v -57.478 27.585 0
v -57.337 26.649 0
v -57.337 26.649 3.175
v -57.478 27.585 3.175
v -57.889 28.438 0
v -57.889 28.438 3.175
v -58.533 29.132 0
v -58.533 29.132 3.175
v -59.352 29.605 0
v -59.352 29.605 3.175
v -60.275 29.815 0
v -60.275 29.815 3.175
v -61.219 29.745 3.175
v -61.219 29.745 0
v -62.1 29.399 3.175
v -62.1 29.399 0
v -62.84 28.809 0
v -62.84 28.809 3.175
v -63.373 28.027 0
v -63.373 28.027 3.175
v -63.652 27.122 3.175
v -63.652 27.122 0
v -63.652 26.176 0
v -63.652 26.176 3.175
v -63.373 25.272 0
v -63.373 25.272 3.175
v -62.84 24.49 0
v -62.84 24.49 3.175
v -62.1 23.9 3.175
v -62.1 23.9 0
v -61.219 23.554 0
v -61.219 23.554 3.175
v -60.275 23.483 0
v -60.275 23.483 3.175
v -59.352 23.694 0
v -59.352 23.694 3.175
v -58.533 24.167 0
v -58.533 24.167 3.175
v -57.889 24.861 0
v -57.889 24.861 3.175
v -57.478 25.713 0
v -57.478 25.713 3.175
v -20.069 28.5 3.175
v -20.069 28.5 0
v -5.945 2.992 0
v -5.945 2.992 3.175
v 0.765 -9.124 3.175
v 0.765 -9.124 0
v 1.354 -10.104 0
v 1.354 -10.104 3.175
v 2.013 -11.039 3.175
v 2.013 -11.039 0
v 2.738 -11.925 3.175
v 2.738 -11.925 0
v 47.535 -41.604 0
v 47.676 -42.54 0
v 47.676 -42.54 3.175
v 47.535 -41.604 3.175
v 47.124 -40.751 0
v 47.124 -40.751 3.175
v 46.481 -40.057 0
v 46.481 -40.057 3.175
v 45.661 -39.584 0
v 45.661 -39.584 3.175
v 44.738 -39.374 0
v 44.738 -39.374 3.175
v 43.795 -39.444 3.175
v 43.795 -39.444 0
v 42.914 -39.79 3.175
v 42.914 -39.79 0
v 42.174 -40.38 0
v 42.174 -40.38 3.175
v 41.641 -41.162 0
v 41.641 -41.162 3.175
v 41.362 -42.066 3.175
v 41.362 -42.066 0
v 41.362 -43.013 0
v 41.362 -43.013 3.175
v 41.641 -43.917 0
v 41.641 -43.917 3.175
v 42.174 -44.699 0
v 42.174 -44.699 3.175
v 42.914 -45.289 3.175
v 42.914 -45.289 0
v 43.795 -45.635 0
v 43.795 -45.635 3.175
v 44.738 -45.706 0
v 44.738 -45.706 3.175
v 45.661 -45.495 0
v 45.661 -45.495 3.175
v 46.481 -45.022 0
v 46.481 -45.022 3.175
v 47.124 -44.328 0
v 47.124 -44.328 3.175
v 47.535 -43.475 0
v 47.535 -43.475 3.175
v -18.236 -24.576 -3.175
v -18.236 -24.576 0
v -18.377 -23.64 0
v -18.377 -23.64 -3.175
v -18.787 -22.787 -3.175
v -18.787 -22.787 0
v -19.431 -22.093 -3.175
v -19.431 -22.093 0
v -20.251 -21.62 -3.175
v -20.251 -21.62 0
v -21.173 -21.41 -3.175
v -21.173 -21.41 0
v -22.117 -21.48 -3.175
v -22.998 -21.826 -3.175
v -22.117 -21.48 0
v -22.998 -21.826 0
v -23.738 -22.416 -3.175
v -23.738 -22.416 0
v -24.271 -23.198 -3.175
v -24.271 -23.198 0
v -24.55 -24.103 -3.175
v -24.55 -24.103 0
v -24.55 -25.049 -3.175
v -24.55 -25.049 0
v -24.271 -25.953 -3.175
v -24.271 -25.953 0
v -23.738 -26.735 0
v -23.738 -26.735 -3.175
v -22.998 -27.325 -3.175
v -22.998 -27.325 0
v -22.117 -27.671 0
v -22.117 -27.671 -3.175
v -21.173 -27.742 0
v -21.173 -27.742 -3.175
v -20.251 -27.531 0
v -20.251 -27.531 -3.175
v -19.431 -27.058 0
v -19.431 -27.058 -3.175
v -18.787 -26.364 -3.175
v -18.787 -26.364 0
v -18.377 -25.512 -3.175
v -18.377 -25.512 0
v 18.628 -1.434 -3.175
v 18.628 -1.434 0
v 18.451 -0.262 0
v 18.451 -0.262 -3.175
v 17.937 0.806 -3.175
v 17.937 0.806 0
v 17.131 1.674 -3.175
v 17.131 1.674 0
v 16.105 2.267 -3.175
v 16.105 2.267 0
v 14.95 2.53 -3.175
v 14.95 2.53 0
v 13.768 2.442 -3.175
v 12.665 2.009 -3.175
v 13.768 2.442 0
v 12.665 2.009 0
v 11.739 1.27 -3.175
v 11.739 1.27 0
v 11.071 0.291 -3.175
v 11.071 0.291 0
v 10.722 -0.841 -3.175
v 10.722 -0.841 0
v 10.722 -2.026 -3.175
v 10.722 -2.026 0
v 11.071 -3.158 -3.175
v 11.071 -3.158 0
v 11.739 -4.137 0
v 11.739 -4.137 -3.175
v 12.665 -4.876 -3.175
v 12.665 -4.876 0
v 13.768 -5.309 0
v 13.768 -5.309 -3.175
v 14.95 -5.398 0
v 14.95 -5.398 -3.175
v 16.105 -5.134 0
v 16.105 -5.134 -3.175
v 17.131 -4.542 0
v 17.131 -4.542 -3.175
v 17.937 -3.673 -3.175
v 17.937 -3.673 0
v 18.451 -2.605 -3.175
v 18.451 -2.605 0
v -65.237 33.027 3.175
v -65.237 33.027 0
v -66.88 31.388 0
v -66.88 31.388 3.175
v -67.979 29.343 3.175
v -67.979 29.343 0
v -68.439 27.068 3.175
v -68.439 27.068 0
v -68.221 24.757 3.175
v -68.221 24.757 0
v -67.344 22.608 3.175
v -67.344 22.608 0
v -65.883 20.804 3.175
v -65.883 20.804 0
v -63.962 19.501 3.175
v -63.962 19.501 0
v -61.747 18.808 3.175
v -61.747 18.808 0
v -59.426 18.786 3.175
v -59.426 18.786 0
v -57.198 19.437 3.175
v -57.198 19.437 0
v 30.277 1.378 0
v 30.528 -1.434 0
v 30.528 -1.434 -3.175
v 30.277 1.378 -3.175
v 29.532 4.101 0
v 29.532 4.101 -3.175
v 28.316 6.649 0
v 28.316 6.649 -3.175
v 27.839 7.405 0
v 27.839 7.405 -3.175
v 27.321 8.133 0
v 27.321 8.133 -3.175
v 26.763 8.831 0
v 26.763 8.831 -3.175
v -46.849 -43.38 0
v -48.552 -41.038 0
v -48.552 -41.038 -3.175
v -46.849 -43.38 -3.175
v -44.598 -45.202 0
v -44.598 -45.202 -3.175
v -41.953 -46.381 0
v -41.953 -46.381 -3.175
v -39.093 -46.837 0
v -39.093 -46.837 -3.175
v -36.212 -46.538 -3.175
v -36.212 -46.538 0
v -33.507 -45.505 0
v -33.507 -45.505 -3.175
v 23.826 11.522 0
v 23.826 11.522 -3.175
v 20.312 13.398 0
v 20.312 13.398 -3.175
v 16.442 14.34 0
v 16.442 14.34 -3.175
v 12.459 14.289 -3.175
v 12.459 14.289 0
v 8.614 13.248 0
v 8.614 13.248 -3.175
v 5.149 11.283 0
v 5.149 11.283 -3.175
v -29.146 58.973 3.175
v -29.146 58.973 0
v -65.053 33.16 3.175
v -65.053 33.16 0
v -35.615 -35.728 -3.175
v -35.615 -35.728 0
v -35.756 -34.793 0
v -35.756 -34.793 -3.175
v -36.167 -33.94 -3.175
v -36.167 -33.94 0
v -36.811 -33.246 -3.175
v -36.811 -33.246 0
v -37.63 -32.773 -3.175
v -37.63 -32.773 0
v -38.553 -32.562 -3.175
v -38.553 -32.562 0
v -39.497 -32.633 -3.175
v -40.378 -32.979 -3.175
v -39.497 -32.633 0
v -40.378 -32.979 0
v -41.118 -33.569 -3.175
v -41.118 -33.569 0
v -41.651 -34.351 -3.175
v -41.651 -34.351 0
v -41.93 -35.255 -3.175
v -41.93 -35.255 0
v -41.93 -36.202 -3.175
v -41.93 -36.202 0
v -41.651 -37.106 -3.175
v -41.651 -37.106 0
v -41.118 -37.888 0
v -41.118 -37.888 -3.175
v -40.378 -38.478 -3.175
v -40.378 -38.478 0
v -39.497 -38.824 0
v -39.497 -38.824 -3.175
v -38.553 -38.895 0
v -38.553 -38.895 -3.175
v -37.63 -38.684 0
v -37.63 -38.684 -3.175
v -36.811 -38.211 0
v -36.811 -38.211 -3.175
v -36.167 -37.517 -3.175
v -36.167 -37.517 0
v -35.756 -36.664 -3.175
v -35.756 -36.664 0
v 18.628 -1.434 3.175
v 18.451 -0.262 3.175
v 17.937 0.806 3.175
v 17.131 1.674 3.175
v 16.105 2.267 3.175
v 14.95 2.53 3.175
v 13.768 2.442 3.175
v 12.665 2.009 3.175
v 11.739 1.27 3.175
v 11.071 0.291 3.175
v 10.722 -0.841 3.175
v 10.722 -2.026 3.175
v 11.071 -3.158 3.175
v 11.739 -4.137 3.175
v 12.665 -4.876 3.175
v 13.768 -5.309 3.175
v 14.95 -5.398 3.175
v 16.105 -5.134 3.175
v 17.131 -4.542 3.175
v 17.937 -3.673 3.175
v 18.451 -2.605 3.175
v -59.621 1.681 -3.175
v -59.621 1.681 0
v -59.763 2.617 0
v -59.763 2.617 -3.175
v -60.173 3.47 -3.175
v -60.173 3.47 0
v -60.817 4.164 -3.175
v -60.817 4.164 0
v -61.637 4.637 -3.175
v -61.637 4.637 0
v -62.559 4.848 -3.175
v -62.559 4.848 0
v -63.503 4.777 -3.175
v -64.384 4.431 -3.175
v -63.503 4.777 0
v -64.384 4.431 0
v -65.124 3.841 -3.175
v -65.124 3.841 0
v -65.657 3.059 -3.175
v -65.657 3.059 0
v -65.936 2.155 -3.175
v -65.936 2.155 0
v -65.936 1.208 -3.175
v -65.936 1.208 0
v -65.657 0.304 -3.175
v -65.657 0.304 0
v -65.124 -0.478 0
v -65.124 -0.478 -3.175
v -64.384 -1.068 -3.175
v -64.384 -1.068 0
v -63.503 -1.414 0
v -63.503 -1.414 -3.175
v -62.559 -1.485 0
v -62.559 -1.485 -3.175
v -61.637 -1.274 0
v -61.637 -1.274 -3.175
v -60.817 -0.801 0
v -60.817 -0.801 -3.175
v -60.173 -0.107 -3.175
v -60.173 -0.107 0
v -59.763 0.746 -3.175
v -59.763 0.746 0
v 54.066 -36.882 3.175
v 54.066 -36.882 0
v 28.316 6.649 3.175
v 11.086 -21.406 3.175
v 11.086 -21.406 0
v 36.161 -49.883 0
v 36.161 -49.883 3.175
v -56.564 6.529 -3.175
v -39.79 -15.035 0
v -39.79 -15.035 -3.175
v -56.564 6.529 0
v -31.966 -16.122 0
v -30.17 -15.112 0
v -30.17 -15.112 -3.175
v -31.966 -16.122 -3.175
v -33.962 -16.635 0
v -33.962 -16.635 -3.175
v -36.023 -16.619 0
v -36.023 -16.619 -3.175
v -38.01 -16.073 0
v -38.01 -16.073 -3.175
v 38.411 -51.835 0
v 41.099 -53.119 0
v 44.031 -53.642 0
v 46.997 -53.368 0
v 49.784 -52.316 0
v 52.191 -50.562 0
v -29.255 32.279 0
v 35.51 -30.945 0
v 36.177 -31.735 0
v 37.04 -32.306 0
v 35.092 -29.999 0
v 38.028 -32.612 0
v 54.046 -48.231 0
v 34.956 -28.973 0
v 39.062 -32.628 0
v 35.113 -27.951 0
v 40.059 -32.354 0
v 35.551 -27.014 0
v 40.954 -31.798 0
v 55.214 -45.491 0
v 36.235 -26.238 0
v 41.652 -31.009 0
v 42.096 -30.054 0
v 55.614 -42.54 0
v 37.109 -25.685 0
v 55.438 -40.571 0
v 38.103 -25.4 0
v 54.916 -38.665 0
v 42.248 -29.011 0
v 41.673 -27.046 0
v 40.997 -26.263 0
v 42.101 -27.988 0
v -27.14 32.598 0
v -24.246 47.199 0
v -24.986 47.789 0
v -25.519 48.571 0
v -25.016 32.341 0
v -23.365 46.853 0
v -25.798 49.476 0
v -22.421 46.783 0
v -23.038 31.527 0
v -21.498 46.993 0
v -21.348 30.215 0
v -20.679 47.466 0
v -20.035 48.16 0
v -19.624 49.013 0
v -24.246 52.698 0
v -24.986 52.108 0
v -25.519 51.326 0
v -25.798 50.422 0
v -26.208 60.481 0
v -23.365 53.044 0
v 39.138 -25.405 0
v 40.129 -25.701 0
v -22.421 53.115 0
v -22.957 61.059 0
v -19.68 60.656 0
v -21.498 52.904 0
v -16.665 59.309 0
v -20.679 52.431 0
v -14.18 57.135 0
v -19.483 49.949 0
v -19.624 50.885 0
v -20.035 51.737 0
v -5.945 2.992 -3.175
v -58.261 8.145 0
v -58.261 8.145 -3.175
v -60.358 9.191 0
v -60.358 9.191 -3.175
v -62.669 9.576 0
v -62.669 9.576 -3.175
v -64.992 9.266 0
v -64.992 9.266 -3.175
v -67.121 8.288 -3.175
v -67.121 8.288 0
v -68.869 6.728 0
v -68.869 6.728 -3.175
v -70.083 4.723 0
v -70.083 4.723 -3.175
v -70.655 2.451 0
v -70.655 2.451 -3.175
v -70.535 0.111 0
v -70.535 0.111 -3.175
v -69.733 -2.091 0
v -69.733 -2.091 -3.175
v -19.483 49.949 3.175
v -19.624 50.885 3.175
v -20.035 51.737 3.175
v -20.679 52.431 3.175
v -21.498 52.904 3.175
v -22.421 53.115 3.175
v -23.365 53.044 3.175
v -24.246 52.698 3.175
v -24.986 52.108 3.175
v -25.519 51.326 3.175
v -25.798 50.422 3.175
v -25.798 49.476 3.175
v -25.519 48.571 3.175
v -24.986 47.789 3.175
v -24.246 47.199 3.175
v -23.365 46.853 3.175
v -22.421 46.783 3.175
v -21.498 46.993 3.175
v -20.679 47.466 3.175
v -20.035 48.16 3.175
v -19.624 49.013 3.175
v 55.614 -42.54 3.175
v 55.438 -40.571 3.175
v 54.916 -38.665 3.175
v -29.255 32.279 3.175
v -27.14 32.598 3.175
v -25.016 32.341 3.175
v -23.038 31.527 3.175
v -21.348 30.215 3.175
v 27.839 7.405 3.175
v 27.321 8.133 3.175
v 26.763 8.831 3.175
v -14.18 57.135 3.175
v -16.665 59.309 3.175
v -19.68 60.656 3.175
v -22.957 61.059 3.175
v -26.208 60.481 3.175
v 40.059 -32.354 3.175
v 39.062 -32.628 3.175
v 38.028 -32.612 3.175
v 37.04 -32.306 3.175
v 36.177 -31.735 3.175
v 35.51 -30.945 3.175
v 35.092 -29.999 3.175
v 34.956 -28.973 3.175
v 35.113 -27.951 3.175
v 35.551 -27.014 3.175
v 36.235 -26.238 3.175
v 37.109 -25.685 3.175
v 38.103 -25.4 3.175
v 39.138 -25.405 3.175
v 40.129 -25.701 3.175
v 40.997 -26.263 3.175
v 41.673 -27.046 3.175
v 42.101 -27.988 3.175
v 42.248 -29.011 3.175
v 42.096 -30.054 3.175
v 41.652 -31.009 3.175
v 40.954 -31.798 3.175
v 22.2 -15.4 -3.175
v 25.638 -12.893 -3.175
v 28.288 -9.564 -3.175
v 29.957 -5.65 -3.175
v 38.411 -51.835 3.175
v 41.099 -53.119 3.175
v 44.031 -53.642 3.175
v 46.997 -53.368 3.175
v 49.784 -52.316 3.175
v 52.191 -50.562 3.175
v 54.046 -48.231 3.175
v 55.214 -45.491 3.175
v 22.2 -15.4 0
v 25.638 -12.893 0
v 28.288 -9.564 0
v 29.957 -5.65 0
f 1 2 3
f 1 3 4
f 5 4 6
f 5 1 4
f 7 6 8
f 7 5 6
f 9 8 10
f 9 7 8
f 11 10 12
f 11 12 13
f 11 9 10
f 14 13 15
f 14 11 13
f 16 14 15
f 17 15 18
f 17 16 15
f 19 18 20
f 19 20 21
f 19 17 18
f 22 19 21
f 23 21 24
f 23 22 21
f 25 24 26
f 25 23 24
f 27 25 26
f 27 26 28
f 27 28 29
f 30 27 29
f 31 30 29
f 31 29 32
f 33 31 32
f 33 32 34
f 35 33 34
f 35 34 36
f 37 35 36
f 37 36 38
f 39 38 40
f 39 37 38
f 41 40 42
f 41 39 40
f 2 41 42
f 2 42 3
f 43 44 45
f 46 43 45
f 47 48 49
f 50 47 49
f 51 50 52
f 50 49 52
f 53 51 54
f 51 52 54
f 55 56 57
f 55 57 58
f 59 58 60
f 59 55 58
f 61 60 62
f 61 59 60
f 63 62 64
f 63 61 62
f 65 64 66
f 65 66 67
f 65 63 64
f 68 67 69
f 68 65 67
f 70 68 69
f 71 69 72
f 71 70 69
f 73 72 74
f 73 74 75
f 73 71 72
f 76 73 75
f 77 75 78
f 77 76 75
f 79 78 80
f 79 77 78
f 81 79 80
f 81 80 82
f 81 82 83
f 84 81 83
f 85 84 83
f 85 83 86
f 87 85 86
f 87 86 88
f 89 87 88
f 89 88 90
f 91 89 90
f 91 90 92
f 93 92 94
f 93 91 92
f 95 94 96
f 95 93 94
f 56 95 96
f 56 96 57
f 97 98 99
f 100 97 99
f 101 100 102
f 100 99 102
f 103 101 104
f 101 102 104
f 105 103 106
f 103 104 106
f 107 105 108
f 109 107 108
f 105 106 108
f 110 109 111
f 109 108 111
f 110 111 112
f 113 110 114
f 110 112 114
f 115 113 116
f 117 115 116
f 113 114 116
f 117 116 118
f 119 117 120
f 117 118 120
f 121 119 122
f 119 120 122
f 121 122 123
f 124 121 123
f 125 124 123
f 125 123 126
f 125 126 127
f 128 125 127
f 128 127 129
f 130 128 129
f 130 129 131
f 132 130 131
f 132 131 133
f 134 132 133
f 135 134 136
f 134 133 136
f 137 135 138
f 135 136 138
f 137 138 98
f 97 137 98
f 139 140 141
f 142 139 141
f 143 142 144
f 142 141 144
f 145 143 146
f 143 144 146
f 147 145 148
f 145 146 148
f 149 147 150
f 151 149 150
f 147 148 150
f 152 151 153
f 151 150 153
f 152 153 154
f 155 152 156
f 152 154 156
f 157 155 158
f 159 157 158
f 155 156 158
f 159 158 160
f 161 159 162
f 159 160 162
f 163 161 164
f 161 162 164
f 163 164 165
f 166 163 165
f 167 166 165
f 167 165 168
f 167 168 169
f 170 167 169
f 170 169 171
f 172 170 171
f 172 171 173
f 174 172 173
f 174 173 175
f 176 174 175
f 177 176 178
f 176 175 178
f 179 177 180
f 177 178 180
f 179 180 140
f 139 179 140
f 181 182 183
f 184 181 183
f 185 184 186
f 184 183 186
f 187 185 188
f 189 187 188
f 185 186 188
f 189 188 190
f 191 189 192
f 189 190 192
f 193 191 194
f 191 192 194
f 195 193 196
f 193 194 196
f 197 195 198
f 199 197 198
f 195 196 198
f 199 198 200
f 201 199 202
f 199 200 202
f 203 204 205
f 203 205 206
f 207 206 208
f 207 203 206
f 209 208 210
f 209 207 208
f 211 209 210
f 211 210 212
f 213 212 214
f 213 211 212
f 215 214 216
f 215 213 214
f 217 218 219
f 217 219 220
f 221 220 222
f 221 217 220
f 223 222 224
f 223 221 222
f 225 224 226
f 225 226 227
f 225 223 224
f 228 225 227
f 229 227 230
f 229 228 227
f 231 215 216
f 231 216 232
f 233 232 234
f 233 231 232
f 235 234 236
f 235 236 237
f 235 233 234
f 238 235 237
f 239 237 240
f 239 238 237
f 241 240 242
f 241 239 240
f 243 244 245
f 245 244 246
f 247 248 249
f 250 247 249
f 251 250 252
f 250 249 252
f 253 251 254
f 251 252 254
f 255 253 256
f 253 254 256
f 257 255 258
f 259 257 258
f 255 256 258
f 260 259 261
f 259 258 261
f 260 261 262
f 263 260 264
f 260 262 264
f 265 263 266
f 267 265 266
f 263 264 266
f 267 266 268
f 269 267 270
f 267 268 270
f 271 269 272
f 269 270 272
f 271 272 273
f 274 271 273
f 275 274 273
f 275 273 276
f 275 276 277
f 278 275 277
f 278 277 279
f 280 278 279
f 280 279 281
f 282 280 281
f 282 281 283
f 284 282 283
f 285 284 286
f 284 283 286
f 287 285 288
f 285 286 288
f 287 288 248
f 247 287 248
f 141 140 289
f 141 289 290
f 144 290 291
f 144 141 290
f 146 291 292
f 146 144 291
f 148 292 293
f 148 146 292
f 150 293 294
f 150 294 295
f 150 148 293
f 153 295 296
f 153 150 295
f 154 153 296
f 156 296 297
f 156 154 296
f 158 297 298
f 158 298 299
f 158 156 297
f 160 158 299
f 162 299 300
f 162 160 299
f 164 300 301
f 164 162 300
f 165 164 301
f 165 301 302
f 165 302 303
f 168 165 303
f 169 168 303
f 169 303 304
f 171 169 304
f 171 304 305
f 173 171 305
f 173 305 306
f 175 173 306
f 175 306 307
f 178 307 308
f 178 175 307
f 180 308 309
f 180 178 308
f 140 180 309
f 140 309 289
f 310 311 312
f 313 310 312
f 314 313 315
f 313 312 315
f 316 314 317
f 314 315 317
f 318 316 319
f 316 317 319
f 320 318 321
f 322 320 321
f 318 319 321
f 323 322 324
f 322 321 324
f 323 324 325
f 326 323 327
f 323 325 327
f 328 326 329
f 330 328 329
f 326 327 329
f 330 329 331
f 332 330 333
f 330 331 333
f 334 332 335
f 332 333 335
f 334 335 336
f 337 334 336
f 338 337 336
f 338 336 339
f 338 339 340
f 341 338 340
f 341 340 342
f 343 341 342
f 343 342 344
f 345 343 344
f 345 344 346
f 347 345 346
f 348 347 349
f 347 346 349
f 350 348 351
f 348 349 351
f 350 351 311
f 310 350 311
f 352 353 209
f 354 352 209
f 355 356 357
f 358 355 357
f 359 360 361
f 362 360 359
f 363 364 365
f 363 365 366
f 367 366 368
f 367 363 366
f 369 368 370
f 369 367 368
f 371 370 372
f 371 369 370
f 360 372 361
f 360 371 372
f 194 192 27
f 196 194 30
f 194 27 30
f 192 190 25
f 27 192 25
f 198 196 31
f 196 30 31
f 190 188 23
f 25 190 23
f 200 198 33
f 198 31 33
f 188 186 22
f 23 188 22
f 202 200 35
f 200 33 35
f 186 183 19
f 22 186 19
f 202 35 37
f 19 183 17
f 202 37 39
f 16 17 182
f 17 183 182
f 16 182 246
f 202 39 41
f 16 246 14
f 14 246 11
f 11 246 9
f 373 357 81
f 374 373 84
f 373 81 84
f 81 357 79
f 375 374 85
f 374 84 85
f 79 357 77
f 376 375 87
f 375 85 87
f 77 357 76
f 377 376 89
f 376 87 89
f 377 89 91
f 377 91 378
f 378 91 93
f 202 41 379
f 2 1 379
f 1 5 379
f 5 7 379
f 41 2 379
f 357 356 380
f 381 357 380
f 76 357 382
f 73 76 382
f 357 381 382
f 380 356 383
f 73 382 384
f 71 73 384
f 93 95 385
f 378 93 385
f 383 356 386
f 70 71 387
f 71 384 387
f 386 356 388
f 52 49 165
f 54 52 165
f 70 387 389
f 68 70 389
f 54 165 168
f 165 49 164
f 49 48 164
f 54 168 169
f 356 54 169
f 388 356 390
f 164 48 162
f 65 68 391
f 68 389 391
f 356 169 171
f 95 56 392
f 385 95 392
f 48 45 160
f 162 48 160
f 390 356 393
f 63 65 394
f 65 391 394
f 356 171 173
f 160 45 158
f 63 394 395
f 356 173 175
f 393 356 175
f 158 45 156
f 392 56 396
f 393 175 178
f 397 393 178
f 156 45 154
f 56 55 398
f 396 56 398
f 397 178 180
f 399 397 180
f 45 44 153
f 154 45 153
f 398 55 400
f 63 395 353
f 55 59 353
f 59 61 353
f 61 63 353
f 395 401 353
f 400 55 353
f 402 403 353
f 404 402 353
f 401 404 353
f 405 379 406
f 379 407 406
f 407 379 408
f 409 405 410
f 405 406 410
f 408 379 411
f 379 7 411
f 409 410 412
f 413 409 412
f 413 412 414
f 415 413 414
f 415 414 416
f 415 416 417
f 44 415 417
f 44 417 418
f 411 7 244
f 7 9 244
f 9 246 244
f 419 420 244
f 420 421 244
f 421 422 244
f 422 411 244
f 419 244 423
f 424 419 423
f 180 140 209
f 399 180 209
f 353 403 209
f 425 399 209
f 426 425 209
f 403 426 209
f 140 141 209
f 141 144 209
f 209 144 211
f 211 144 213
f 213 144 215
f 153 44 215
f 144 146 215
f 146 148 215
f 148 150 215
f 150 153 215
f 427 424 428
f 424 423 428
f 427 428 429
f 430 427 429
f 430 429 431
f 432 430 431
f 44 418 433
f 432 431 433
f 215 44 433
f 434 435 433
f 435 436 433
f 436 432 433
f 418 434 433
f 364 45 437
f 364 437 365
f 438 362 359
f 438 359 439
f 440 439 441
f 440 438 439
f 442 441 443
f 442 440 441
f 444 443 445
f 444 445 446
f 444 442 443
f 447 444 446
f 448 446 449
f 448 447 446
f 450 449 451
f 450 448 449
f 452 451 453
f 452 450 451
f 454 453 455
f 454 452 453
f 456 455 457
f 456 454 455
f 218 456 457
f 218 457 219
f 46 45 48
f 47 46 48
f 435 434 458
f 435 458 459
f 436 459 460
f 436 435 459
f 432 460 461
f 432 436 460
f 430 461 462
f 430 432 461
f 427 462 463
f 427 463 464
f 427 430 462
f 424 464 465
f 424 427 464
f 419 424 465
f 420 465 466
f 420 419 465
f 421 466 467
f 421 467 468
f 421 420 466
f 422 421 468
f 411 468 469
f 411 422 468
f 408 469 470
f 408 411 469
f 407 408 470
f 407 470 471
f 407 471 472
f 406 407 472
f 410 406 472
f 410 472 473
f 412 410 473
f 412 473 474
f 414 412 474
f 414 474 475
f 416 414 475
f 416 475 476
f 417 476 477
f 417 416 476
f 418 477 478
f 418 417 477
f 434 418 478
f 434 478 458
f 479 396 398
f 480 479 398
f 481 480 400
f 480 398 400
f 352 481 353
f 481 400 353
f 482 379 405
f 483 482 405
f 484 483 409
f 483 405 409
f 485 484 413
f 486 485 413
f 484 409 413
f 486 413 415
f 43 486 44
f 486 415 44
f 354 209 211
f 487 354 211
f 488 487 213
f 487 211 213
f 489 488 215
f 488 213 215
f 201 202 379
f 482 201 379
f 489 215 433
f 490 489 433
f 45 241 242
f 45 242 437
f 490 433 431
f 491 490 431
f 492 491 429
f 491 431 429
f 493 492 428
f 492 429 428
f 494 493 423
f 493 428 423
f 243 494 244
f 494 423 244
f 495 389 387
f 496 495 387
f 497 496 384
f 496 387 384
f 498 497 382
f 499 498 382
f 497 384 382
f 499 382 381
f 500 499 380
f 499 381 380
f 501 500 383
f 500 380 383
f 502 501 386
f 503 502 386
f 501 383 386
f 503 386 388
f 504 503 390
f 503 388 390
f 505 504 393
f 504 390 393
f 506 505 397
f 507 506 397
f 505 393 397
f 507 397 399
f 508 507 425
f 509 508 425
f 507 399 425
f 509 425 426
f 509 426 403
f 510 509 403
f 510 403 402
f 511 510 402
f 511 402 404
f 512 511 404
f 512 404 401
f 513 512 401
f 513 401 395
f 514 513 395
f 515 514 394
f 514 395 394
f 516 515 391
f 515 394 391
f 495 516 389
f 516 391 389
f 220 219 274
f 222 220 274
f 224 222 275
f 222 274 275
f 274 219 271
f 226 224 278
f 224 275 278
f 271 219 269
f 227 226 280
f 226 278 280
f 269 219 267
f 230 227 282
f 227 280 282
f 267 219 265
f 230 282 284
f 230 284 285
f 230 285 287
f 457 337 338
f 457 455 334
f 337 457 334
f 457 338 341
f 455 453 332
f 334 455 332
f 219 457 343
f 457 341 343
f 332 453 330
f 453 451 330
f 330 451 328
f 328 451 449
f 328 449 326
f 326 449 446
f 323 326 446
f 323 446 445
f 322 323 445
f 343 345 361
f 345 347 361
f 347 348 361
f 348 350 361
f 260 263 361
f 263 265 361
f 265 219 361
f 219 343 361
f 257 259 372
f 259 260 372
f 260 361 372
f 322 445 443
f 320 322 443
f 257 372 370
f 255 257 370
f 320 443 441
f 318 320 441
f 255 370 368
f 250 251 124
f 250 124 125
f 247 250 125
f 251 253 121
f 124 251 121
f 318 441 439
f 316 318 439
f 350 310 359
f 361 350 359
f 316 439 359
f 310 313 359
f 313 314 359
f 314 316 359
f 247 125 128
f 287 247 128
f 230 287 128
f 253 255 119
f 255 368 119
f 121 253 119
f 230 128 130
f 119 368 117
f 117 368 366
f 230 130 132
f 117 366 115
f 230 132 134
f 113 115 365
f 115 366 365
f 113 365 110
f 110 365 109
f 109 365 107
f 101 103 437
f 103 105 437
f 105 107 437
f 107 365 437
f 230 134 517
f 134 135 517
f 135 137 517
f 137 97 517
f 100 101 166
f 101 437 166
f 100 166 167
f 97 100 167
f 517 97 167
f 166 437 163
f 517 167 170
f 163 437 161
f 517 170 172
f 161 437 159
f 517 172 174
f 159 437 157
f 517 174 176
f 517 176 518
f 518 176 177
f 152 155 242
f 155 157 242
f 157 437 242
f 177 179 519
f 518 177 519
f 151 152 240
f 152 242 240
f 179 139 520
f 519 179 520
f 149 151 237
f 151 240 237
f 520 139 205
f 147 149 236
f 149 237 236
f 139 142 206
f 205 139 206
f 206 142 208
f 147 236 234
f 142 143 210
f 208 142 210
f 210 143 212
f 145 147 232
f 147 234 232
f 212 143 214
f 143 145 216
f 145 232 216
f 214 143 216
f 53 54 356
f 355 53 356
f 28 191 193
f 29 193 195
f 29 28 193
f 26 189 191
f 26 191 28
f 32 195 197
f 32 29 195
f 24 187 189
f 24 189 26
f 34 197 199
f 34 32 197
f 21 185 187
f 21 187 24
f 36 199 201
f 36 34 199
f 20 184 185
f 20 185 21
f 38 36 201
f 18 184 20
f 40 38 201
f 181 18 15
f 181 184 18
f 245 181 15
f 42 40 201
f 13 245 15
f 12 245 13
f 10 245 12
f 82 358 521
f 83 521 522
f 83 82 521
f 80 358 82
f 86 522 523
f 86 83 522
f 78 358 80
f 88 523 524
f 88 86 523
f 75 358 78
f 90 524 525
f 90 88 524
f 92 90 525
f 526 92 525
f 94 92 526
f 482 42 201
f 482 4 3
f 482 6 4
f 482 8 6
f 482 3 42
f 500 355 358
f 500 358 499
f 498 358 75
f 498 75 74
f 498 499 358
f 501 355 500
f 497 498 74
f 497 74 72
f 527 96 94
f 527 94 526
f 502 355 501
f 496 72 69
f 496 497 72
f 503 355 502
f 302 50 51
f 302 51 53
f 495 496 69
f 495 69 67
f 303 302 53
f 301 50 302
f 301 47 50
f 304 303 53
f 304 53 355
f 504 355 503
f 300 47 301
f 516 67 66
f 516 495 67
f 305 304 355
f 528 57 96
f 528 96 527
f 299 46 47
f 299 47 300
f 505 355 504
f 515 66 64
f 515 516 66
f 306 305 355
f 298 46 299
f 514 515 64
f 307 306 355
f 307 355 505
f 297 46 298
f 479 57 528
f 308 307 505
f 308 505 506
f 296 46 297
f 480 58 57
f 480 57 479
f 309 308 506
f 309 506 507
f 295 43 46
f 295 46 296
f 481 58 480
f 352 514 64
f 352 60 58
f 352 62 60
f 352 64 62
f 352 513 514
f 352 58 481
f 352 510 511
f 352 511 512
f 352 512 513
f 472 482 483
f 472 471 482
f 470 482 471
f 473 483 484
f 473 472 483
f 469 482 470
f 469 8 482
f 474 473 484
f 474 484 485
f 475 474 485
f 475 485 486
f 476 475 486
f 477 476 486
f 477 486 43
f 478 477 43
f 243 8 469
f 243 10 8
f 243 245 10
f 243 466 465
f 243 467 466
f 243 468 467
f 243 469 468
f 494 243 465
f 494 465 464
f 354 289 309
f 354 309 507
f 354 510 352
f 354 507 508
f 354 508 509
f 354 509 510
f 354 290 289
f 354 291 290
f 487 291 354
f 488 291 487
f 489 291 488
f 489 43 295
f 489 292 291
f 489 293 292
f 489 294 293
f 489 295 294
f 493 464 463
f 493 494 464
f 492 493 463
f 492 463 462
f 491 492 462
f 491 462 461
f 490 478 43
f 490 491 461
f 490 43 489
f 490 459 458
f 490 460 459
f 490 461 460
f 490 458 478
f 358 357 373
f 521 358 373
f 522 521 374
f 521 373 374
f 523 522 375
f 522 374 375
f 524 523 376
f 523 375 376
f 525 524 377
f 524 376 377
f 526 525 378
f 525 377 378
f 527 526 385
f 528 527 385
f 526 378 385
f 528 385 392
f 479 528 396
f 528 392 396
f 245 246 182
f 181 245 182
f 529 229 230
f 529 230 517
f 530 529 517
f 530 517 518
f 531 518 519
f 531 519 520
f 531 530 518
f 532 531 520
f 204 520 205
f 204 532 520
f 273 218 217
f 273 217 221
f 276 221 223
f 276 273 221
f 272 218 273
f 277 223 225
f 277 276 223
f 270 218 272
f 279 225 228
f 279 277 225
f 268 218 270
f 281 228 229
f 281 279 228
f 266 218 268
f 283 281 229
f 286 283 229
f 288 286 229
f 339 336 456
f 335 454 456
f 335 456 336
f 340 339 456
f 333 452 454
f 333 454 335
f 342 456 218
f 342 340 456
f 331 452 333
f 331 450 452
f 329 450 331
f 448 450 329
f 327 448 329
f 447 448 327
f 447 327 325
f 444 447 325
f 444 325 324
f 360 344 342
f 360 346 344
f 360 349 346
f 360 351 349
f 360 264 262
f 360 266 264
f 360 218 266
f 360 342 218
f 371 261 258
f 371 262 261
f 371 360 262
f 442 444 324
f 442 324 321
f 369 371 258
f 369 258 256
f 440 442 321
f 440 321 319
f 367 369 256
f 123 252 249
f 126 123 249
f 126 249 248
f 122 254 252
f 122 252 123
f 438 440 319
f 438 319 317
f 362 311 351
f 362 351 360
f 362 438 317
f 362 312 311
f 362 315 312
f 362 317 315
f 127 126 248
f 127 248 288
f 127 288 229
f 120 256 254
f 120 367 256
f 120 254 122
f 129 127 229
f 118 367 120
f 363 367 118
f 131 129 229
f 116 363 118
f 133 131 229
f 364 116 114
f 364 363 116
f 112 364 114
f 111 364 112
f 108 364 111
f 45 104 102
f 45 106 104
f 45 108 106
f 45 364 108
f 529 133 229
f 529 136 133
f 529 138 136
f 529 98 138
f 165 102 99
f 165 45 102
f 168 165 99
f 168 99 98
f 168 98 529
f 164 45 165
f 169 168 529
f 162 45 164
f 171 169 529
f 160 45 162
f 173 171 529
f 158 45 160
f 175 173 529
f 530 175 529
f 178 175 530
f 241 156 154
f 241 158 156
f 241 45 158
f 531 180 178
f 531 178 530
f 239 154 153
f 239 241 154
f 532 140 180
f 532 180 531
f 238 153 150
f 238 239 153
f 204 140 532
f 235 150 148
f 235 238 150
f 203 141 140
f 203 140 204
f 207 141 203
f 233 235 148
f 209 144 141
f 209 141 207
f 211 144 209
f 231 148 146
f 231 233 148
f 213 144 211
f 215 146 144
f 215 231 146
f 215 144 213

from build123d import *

# Parameters (mm, degrees)
F0_R     = 3.9751
F0_R_2   = 3.175
F1_DEPTH = 3.175
F2_DEPTH = 3.175


# Not quite as in the source:
# - a feature names something its author has since deleted; it is built from what else it names


with BuildPart() as f1:
    # F0 (on Top) → F1 (new body)
    with BuildSketch(Plane.XY):
        with BuildLine():
            ThreePointArc((-52.5748759492, 26.6492032122), (-53.8297565711, 22.3659212349), (-57.1976172398, 19.436971869))
            Line((-57.1976172398, 19.436971869), (-29.2551448321, 32.2793987644))
            ThreePointArc((-29.2551448321, 32.2793987644), (-23.9994310398, 32.0006966991), (-20.0694910529, 28.4998719382))
            Line((-20.0694910529, 28.4998719382), (-5.944542276, 2.9919030157))
            Line((-5.944542276, 2.9919030157), (5.1493091314, 11.2826215199))
            ThreePointArc((5.1493091314, 11.2826215199), (16.4418739956, 14.3401507274), (26.7626398944, 8.830858819))
            Line((26.7626398944, 8.830858819), (-14.1799710904, 57.1349621747))
            ThreePointArc((-14.1799710904, 57.1349621747), (-12.2239065675, 53.7759255754), (-11.5441699975, 49.9487499211))
            ThreePointArc((-11.5441699975, 49.9487499211), (-27.7288475633, 40.0587377986), (-29.1456623364, 58.9729854334))
            Line((-29.1456623364, 58.9729854334), (-65.0529744577, 33.1597232709))
            ThreePointArc((-65.0529744577, 33.1597232709), (-56.8406661575, 33.6864223686), (-52.5748759492, 26.6492032122))
        make_face()
        with BuildLine():
            Line((54.0656193027, -36.8819923981), (28.3160345311, 6.6486574689))
            ThreePointArc((28.3160345311, 6.6486574689), (29.9646775383, 2.7560340053), (30.5275292295, -1.4336842631))
            ThreePointArc((30.5275292295, -1.4336842631), (28.2876322337, -9.5638497635), (22.2000216938, -15.3997496539))
            Line((22.2000216938, -15.3997496539), (11.0862799953, -21.4057992729))
            Line((11.0862799953, -21.4057992729), (36.1609723562, -49.8832569445))
            ThreePointArc((36.1609723562, -49.8832569445), (33.6536306121, -40.1274456475), (40.059076729, -32.3535870991))
            ThreePointArc((40.059076729, -32.3535870991), (47.9196841374, -31.9660141026), (54.0656193027, -36.8819923981))
        make_face()
        with BuildLine():
            ThreePointArc((42.2477037346, -29.0114467929), (41.6518612023, -31.0089446024), (40.059076729, -32.3535870991))
            ThreePointArc((40.059076729, -32.3535870991), (35.5513078202, -27.0139489834), (42.2477037346, -29.0114467929))
        make_face(mode=Mode.SUBTRACT)
        with BuildLine():
            ThreePointArc((28.3160345311, 6.6486574689), (27.5854454003, 7.7725801433), (26.7626398944, 8.830858819))
            ThreePointArc((26.7626398944, 8.830858819), (16.4418739956, 14.3401507274), (5.1493091314, 11.2826215199))
            ThreePointArc((5.1493091314, 11.2826215199), (-0.8682400489, 1.9011839514), (0.7646299709, -9.1240600136))
            ThreePointArc((0.7646299709, -9.1240600136), (1.6755313717, -10.5777069884), (2.7379674647, -11.9245775975))
            ThreePointArc((2.7379674647, -11.9245775975), (11.8620044089, -17.0614990888), (22.2000216938, -15.3997496539))
            ThreePointArc((22.2000216938, -15.3997496539), (28.2876322337, -9.5638497635), (30.5275292295, -1.4336842631))
            ThreePointArc((30.5275292295, -1.4336842631), (29.9646775383, 2.7560340053), (28.3160345311, 6.6486574689))
        make_face()
        with Locations((14.6525292295, -1.4336842631)):
            Circle(F0_R, mode=Mode.SUBTRACT)
        with BuildLine():
            ThreePointArc((55.6136655916, -42.5396316105), (55.2196694077, -39.6068288226), (54.0656193027, -36.8819923981))
            ThreePointArc((54.0656193027, -36.8819923981), (47.9196841374, -31.9660141026), (40.059076729, -32.3535870991))
            ThreePointArc((40.059076729, -32.3535870991), (33.6536306121, -40.1274456475), (36.1609723562, -49.8832569445))
            ThreePointArc((36.1609723562, -49.8832569445), (48.4259113746, -52.9359784106), (55.6136655916, -42.5396316105))
        make_face()
        with Locations((44.5011655916, -42.5396316105)):
            Circle(F0_R_2, mode=Mode.SUBTRACT)
        with BuildLine():
            Line((5.1493091314, 11.2826215199), (-5.944542276, 2.9919030157))
            Line((-5.944542276, 2.9919030157), (0.7646299709, -9.1240600136))
            ThreePointArc((0.7646299709, -9.1240600136), (-0.8682400489, 1.9011839514), (5.1493091314, 11.2826215199))
        make_face()
        with BuildLine():
            ThreePointArc((22.2000216938, -15.3997496539), (11.8620044089, -17.0614990888), (2.7379674647, -11.9245775975))
            Line((2.7379674647, -11.9245775975), (11.0862799953, -21.4057992729))
            Line((11.0862799953, -21.4057992729), (22.2000216938, -15.3997496539))
        make_face()
        with BuildLine():
            ThreePointArc((-14.1799710904, 57.1349621747), (-21.3034591884, 60.9799616773), (-29.1456623364, 58.9729854334))
            ThreePointArc((-29.1456623364, 58.9729854334), (-27.7288475633, 40.0587377986), (-11.5441699975, 49.9487499211))
            ThreePointArc((-11.5441699975, 49.9487499211), (-12.2239065675, 53.7759255754), (-14.1799710904, 57.1349621747))
        make_face()
        with Locations((-22.6582662231, 49.9487499211)):
            Circle(F0_R_2, mode=Mode.SUBTRACT)
        with BuildLine():
            Line((-65.0529744577, 33.1597232709), (-65.2372085825, 33.0272799472))
            ThreePointArc((-65.2372085825, 33.0272799472), (-67.3440079309, 22.6078283574), (-57.1976172398, 19.436971869))
            ThreePointArc((-57.1976172398, 19.436971869), (-53.8297565711, 22.3659212349), (-52.5748759492, 26.6492032122))
            ThreePointArc((-52.5748759492, 26.6492032122), (-56.8406661575, 33.6864223686), (-65.0529744577, 33.1597232709))
        make_face()
        with Locations((-60.5123759492, 26.6492032122)):
            Circle(F0_R_2, mode=Mode.SUBTRACT)
    extrude(amount=F1_DEPTH)


with BuildPart() as f2:
    # F0 (on Top) → F2 (new body)
    with BuildSketch(Plane.XY):
        with BuildLine():
            Line((0.7646299709, -9.1240600136), (-5.944542276, 2.9919030157))
            Line((-5.944542276, 2.9919030157), (-30.1699189245, -15.1123396928))
            ThreePointArc((-30.1699189245, -15.1123396928), (-34.9928458304, -16.6939584439), (-39.7898032928, -15.0352417962))
            Line((-39.7898032928, -15.0352417962), (-56.5640629887, 6.5293747809))
            ThreePointArc((-56.5640629887, 6.5293747809), (-55.3280021129, 4.2441334268), (-54.9005552207, 1.6814271055))
            ThreePointArc((-54.9005552207, 1.6814271055), (-60.8502677302, -5.9708830942), (-69.7329844925, -2.090899427))
            Line((-69.7329844925, -2.090899427), (-48.5523916303, -41.0375117468))
            ThreePointArc((-48.5523916303, -41.0375117468), (-41.5291855152, -24.9587969806), (-27.6776447878, -35.7284447066))
            ThreePointArc((-27.6776447878, -35.7284447066), (-29.2455726849, -41.419560557), (-33.5069000628, -45.5046904802))
            Line((-33.5069000628, -45.5046904802), (11.0862799953, -21.4057992729))
            Line((11.0862799953, -21.4057992729), (2.7379674647, -11.9245775975))
            ThreePointArc((2.7379674647, -11.9245775975), (1.6755313717, -10.5777069884), (0.7646299709, -9.1240600136))
        make_face()
        with Locations((-21.4105871974, -24.5757886104)):
            Circle(F0_R_2, mode=Mode.SUBTRACT)
        with BuildLine():
            ThreePointArc((-54.9005552207, 1.6814271055), (-55.3280021129, 4.2441334268), (-56.5640629887, 6.5293747809))
            ThreePointArc((-56.5640629887, 6.5293747809), (-67.1209676687, 8.2878151961), (-69.7329844925, -2.090899427))
            ThreePointArc((-69.7329844925, -2.090899427), (-60.8502677302, -5.9708830942), (-54.9005552207, 1.6814271055))
        make_face()
        with Locations((-62.7964770983, 1.6814271055)):
            Circle(F0_R_2, mode=Mode.SUBTRACT)
        with BuildLine():
            ThreePointArc((-48.5523916303, -41.0375117468), (-41.9531001228, -46.3813020604), (-33.5069000628, -45.5046904802))
            ThreePointArc((-33.5069000628, -45.5046904802), (-29.2455726849, -41.419560557), (-27.6776447878, -35.7284447066))
            ThreePointArc((-27.6776447878, -35.7284447066), (-41.5291855152, -24.9587969806), (-48.5523916303, -41.0375117468))
        make_face()
        with Locations((-38.7901447878, -35.7284447066)):
            Circle(F0_R_2, mode=Mode.SUBTRACT)
        with BuildLine():
            Line((5.1493091314, 11.2826215199), (-5.944542276, 2.9919030157))
            Line((-5.944542276, 2.9919030157), (0.7646299709, -9.1240600136))
            ThreePointArc((0.7646299709, -9.1240600136), (-0.8682400489, 1.9011839514), (5.1493091314, 11.2826215199))
        make_face()
        with BuildLine():
            ThreePointArc((22.2000216938, -15.3997496539), (11.8620044089, -17.0614990888), (2.7379674647, -11.9245775975))
            Line((2.7379674647, -11.9245775975), (11.0862799953, -21.4057992729))
            Line((11.0862799953, -21.4057992729), (22.2000216938, -15.3997496539))
        make_face()
        with BuildLine():
            ThreePointArc((28.3160345311, 6.6486574689), (27.5854454003, 7.7725801433), (26.7626398944, 8.830858819))
            ThreePointArc((26.7626398944, 8.830858819), (16.4418739956, 14.3401507274), (5.1493091314, 11.2826215199))
            ThreePointArc((5.1493091314, 11.2826215199), (-0.8682400489, 1.9011839514), (0.7646299709, -9.1240600136))
            ThreePointArc((0.7646299709, -9.1240600136), (1.6755313717, -10.5777069884), (2.7379674647, -11.9245775975))
            ThreePointArc((2.7379674647, -11.9245775975), (11.8620044089, -17.0614990888), (22.2000216938, -15.3997496539))
            ThreePointArc((22.2000216938, -15.3997496539), (28.2876322337, -9.5638497635), (30.5275292295, -1.4336842631))
            ThreePointArc((30.5275292295, -1.4336842631), (29.9646775383, 2.7560340053), (28.3160345311, 6.6486574689))
        make_face()
        with Locations((14.6525292295, -1.4336842631)):
            Circle(F0_R, mode=Mode.SUBTRACT)
    extrude(amount=-F2_DEPTH)


solid = Compound([f1.part, f2.part])
